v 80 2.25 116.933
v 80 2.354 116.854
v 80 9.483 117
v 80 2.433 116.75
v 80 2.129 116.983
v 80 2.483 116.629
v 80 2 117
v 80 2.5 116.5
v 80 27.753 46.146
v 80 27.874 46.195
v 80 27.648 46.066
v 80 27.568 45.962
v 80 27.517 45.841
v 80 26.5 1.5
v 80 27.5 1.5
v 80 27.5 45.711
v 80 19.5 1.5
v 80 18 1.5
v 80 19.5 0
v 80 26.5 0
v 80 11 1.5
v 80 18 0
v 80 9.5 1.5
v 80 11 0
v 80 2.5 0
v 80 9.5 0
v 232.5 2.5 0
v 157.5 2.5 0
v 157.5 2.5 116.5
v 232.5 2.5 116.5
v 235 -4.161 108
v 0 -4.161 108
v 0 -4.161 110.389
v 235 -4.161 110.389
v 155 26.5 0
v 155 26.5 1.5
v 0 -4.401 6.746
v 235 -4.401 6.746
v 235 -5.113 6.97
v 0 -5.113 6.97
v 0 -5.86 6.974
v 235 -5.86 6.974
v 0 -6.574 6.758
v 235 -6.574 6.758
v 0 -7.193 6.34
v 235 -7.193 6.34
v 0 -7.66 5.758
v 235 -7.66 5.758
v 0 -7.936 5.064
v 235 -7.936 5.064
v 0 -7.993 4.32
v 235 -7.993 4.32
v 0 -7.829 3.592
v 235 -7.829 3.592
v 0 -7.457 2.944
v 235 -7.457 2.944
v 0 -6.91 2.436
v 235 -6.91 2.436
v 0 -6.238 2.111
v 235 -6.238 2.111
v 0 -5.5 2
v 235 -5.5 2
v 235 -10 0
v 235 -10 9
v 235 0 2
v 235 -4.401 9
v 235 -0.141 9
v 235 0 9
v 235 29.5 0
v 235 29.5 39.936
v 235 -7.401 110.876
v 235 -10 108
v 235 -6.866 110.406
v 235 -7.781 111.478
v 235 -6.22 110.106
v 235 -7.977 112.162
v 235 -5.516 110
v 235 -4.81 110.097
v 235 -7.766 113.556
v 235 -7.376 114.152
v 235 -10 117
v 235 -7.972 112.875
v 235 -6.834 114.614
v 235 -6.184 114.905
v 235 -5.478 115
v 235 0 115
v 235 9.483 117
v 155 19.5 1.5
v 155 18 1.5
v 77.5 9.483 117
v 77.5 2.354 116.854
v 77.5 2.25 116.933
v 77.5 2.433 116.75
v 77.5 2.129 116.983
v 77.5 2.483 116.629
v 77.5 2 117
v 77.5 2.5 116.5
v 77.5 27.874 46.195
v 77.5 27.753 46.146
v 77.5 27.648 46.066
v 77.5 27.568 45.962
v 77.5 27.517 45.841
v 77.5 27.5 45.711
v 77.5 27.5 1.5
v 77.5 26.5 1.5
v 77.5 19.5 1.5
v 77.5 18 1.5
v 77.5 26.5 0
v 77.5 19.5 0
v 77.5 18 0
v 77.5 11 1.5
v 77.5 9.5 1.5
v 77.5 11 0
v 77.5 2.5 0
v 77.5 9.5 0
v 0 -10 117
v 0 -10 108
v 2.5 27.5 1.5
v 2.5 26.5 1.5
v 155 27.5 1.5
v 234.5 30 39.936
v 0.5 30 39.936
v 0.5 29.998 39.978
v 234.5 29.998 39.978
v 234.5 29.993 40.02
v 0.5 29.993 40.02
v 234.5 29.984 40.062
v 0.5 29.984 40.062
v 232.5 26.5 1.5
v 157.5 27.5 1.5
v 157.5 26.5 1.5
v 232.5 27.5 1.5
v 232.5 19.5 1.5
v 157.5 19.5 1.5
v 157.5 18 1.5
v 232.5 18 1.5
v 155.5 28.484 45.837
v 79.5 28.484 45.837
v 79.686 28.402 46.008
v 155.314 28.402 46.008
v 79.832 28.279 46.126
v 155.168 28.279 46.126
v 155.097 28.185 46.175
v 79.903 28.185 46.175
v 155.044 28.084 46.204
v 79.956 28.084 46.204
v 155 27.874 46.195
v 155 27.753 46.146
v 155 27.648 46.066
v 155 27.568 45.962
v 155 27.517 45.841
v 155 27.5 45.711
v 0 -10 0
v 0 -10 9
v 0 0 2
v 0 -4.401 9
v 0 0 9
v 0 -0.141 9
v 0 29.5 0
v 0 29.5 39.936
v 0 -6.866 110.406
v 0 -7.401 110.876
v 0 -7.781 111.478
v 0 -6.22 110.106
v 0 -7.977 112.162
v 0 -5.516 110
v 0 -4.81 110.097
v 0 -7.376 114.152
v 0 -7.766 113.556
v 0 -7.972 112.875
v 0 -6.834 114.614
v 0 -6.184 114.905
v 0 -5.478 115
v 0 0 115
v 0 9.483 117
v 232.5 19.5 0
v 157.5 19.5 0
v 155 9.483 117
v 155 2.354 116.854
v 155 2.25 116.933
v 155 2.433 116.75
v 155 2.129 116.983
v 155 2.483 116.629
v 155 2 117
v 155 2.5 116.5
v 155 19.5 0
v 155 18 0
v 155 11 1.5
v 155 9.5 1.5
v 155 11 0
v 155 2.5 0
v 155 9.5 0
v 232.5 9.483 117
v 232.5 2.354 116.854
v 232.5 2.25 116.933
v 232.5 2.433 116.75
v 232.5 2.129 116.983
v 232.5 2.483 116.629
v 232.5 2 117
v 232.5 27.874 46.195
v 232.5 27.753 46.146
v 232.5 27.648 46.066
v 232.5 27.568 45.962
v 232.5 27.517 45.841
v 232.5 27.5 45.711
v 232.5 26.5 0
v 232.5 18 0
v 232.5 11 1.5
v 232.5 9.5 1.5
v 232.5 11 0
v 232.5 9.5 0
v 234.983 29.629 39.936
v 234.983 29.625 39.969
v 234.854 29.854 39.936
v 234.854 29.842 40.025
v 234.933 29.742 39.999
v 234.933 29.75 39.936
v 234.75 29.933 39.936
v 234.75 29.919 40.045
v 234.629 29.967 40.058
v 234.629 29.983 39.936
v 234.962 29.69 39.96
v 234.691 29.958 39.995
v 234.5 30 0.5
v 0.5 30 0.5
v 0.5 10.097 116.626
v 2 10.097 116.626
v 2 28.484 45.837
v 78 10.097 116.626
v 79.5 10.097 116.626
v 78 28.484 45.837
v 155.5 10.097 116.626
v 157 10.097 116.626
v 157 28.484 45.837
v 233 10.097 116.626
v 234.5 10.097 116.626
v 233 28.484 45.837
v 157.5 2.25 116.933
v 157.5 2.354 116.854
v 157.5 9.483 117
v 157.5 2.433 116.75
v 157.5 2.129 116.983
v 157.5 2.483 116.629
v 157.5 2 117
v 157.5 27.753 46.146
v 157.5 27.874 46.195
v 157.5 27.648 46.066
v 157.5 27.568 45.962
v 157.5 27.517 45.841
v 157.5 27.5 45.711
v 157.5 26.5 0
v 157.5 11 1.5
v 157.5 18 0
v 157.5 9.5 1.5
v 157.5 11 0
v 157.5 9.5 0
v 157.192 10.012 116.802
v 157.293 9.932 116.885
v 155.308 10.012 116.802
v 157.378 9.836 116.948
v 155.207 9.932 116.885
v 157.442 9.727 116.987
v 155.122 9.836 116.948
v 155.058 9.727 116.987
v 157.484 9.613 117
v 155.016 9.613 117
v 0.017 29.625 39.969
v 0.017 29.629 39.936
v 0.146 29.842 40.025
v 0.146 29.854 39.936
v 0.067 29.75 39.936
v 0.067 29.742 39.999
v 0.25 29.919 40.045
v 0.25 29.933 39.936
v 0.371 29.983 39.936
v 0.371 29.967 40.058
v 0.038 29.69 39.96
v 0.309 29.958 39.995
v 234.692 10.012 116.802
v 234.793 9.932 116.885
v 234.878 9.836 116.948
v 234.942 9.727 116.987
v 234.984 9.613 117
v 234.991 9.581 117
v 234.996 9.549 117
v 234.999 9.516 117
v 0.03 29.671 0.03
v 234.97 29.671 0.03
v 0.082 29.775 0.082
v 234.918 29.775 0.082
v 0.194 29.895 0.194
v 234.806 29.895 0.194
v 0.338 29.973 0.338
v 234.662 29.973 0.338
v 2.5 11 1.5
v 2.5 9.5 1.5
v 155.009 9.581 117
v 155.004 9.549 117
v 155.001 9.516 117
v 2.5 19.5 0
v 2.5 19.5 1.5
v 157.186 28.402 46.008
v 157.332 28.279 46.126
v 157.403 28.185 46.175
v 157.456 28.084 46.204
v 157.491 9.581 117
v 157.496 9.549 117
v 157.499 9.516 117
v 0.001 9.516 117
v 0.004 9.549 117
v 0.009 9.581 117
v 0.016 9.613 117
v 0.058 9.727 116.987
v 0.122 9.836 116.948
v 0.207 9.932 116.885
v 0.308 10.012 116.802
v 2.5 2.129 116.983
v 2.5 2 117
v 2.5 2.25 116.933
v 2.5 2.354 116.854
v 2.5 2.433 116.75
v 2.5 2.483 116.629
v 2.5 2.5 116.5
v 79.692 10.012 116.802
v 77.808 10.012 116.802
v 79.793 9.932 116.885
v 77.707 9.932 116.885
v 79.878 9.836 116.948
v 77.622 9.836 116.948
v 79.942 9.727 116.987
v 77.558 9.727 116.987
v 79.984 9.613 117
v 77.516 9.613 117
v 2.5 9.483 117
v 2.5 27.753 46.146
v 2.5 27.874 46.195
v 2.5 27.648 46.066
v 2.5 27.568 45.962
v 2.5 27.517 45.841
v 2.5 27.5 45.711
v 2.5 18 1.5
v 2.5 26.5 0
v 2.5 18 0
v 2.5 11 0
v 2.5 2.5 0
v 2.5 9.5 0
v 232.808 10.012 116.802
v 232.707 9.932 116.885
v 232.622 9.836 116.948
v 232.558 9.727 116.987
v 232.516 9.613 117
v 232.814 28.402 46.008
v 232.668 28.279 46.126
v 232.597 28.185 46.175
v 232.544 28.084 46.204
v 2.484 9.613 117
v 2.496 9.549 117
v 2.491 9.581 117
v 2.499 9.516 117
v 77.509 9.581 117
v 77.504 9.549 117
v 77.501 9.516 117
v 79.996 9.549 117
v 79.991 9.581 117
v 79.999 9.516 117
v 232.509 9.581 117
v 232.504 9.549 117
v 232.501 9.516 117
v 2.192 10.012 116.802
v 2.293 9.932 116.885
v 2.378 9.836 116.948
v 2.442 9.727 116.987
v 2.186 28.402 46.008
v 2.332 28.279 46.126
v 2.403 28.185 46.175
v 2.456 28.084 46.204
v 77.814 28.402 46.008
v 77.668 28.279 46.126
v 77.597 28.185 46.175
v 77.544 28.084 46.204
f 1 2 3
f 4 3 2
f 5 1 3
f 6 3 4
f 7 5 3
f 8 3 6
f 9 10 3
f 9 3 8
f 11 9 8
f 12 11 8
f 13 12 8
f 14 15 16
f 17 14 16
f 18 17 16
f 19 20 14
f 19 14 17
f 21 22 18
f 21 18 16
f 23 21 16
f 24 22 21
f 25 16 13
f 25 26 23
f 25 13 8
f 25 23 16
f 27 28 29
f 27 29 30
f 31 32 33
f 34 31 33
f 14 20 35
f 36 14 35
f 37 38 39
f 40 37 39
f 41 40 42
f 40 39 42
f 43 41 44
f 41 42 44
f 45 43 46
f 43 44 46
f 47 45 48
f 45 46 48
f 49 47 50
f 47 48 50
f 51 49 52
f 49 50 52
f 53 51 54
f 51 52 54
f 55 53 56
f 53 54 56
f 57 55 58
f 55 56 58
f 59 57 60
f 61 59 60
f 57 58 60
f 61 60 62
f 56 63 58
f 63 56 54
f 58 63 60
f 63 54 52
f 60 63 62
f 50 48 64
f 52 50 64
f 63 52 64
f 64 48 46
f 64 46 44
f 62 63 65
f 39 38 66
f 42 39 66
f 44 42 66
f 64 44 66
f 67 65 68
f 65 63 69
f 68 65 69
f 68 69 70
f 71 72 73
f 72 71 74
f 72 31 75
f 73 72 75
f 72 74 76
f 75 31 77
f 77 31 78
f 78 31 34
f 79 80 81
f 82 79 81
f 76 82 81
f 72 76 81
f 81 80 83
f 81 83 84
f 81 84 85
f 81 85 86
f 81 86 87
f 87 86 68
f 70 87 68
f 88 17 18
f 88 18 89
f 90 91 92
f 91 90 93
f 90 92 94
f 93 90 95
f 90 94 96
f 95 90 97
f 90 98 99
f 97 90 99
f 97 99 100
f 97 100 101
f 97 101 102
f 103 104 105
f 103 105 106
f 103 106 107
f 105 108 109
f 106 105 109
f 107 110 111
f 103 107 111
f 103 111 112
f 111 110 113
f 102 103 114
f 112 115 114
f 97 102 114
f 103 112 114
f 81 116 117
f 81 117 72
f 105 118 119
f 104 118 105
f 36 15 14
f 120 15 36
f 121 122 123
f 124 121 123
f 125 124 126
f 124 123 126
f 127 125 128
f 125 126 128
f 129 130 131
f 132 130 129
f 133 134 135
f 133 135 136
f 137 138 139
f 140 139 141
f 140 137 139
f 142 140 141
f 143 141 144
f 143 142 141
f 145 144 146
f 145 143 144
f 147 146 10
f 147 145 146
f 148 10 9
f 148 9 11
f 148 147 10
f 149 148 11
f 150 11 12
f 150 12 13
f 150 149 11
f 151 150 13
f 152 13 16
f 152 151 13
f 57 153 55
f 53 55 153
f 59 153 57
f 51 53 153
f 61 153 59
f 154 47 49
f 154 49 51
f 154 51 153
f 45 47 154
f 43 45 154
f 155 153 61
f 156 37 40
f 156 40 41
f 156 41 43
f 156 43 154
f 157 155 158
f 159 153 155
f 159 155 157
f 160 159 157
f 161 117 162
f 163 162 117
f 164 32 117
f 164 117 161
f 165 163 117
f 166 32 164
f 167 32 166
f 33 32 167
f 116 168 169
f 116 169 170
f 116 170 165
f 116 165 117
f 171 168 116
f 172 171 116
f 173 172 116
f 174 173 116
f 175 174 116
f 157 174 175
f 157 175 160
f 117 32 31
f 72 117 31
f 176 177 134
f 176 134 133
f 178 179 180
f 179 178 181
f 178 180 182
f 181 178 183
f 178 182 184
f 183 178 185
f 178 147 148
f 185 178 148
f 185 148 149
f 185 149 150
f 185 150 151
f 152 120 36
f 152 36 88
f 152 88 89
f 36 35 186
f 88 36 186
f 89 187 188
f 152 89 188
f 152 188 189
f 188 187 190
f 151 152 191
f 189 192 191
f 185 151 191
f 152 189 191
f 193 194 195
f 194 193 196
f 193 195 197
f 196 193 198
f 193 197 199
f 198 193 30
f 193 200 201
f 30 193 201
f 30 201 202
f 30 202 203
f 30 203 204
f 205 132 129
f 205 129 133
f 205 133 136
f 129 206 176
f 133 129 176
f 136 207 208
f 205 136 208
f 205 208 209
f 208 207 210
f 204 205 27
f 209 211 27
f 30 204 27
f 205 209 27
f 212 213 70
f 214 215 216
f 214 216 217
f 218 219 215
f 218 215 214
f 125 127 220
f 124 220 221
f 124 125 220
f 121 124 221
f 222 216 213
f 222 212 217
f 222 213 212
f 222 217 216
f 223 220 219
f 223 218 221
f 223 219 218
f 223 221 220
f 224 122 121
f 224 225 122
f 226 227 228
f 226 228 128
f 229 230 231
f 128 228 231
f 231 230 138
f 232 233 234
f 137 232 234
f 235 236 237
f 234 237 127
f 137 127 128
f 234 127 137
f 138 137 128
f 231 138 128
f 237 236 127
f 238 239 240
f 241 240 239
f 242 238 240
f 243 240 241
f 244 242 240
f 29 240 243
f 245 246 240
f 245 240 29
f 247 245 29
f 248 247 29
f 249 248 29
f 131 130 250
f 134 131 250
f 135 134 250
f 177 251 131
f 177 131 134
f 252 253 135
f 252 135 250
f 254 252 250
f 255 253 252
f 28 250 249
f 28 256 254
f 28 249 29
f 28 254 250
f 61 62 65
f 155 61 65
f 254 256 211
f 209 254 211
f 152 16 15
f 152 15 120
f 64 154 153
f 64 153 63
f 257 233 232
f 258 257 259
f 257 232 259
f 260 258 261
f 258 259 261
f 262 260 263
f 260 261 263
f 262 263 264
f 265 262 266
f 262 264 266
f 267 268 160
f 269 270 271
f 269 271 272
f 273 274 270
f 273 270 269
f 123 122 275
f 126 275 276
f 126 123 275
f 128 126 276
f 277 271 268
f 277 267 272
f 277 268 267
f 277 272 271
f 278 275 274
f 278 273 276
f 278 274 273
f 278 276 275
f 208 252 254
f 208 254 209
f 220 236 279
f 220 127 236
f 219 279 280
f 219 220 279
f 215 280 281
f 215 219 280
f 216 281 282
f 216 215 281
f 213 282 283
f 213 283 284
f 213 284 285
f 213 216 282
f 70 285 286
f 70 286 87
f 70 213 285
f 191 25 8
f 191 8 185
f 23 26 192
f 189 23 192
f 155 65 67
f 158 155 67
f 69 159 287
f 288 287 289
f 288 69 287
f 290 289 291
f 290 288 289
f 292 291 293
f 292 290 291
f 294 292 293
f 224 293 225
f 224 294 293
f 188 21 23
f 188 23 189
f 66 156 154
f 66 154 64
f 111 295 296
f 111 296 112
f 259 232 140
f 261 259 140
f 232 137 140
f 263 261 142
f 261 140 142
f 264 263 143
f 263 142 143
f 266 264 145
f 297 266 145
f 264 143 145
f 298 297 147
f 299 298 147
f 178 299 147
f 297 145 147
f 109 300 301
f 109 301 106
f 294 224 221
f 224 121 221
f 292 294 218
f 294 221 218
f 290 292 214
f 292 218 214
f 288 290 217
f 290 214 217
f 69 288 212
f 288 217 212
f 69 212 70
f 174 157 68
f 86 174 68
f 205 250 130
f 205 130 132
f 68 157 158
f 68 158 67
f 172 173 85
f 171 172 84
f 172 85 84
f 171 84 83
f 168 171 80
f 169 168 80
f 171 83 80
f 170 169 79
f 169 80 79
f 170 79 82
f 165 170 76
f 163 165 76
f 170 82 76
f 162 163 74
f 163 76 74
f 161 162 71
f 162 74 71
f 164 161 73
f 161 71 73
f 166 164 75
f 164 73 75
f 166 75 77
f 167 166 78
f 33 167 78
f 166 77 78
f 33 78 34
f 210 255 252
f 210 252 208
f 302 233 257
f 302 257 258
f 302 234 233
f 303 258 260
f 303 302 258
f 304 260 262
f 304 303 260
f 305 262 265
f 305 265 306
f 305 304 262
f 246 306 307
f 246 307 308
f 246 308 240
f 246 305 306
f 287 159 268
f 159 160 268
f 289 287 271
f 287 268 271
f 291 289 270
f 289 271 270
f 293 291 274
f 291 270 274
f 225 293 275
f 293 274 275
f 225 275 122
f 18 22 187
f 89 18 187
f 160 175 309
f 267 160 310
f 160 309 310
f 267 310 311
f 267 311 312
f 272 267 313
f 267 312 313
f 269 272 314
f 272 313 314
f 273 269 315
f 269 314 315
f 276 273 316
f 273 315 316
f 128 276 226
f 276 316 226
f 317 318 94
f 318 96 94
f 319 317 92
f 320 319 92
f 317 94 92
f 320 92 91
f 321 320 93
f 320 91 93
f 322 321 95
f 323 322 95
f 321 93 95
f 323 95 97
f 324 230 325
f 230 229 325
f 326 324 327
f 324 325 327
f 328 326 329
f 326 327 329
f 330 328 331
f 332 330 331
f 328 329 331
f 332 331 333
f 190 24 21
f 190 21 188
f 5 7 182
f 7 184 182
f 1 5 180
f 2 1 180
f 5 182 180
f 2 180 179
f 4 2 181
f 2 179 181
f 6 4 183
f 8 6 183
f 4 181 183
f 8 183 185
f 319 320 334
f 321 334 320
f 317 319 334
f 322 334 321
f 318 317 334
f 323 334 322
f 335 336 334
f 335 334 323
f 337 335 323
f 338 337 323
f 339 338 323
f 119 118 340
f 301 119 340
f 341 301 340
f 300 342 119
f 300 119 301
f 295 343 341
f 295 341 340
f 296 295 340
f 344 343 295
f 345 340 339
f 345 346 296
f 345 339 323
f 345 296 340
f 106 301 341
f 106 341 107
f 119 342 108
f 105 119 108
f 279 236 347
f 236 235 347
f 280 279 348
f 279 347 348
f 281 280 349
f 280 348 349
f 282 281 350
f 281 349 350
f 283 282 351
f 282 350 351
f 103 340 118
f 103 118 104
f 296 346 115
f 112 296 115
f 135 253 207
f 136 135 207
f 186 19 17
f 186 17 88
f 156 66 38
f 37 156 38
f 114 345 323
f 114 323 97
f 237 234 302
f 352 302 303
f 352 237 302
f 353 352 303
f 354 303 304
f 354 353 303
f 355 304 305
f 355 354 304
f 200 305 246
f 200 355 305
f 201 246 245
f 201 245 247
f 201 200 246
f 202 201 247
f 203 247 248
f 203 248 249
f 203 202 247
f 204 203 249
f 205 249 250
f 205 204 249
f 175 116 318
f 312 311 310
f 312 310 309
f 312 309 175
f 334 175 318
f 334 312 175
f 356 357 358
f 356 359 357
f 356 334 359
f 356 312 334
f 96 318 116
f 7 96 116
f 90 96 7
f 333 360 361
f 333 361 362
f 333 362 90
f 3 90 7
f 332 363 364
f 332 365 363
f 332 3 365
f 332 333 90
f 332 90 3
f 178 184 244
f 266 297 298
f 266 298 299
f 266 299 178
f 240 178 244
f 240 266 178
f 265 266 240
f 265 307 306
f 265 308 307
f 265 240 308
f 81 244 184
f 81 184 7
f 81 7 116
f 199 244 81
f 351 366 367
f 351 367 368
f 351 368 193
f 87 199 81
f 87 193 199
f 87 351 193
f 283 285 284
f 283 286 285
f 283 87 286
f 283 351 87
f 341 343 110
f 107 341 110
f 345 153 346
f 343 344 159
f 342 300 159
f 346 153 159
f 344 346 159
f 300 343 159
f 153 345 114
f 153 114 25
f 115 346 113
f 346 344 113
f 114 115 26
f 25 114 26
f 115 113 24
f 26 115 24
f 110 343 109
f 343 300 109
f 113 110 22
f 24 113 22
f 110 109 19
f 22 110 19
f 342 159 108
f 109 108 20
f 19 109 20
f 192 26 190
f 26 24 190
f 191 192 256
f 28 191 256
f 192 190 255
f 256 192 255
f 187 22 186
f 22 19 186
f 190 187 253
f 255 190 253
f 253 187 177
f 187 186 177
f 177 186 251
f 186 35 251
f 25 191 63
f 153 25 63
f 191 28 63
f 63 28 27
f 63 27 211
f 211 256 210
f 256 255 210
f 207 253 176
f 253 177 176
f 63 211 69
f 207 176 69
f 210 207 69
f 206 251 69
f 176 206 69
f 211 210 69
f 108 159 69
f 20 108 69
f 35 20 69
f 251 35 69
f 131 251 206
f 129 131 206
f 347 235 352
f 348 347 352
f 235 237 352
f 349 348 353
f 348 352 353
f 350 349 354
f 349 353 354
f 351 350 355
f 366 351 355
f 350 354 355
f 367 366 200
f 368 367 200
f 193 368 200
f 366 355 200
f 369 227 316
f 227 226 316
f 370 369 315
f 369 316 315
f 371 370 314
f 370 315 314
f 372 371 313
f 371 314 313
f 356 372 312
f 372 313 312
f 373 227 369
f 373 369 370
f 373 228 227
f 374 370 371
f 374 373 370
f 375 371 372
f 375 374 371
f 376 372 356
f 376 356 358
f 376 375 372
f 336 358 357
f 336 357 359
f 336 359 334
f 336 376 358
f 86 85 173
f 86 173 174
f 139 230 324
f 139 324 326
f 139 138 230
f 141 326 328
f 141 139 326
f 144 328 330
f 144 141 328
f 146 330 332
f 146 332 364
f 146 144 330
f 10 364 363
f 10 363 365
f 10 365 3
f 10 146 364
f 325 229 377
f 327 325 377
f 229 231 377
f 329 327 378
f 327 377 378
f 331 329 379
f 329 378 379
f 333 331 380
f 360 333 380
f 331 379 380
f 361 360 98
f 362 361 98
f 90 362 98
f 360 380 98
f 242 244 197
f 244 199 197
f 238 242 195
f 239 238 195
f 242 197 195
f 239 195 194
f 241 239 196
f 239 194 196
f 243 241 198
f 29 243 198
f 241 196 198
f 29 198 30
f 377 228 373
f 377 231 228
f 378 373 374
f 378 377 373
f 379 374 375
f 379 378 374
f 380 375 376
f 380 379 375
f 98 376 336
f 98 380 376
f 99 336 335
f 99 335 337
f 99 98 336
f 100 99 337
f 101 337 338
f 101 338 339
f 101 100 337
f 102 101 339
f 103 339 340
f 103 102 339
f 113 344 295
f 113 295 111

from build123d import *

# Parameters (mm, degrees)
BOX_W                              = 235
BOX_H                              = 30
BOX_DEPTH                          = 117
SKETCH_W                           = 75
SKETCH_H                           = 25
POCKET_DEPTH                       = 115.5
POCKET001_DEPTH                    = 300
SKETCH002_W                        = 75
SKETCH002_H                        = 7
POCKET002_DEPTH                    = 5
SKETCH002_LINEARPATTERN001_2_W     = 75
SKETCH002_LINEARPATTERN001_2_H     = 7
POCKET002_LINEARPATTERN001_2_DEPTH = 5
SKETCH002_LINEARPATTERN001_3_W     = 75
SKETCH002_LINEARPATTERN001_3_H     = 7
POCKET002_LINEARPATTERN001_3_DEPTH = 5
LINEARPATTERN002_COUNT             = 3
LINEARPATTERN002_PITCH             = 8.5
FILLET_R                           = 0.5
SKETCH003_W                        = 235
SKETCH003_H                        = 9
PAD_DEPTH                          = 10
POCKET003_DEPTH                    = 235.001


with BuildPart() as part:
    # Box → Box (new body)
    with BuildSketch(Plane.XY):
        with Locations((117.5, 15)):
            Rectangle(BOX_W, BOX_H)
    extrude(amount=BOX_DEPTH)

    # Sketch (on Face6 of BaseFeature) → Pocket (cut)
    with BuildSketch(Plane.XY.offset(117)):
        with Locations((40, 15)):
            Rectangle(SKETCH_W, SKETCH_H)
        with Locations((117.5, 15)):
            Rectangle(SKETCH_W, SKETCH_H)
        with Locations((195, 15)):
            Rectangle(SKETCH_W, SKETCH_H)
    extrude(amount=-POCKET_DEPTH, mode=Mode.SUBTRACT)

    # Sketch001 (on Face6 of Pocket) → Pocket001 (cut)
    with BuildSketch(Plane.YZ.offset(235)):
        Polygon((10, 117), (30, 40), (40, 120), align=None)
    extrude(amount=-POCKET001_DEPTH, mode=Mode.SUBTRACT)

    # Sketch002 (on Face5 of Pocket001) → Pocket002 (cut)
    with BuildSketch(Plane(origin=(0, 0, 0), x_dir=(1, 0, 0), z_dir=(0, 0, -1))):
        with Locations((40, -6)):
            Rectangle(SKETCH002_W, SKETCH002_H)
    pocket002 = extrude(amount=-POCKET002_DEPTH, mode=Mode.SUBTRACT)

    # Sketch002 LinearPattern001 2 → Pocket002 LinearPattern001 2 (cut)
    with BuildSketch(Plane(origin=(77.5, 0, 0), x_dir=(1, 0, 0), z_dir=(0, 0, -1))):
        with Locations((40, -6)):
            Rectangle(SKETCH002_LINEARPATTERN001_2_W, SKETCH002_LINEARPATTERN001_2_H)
    pocket002_linearpattern001_2 = extrude(amount=-POCKET002_LINEARPATTERN001_2_DEPTH, mode=Mode.SUBTRACT)

    # Sketch002 LinearPattern001 3 → Pocket002 LinearPattern001 3 (cut)
    with BuildSketch(Plane(origin=(155, 0, 0), x_dir=(1, 0, 0), z_dir=(0, 0, -1))):
        with Locations((40, -6)):
            Rectangle(SKETCH002_LINEARPATTERN001_3_W, SKETCH002_LINEARPATTERN001_3_H)
    pocket002_linearpattern001_3 = extrude(amount=-POCKET002_LINEARPATTERN001_3_DEPTH, mode=Mode.SUBTRACT)

    # LinearPattern002: Pocket002, Pocket002 LinearPattern001 2, Pocket002 LinearPattern001 3 ×3
    with Locations(*[(0, i * LINEARPATTERN002_PITCH, 0) for i in range(1, LINEARPATTERN002_COUNT)]):
        add(pocket002, mode=Mode.SUBTRACT)
        add(pocket002_linearpattern001_2, mode=Mode.SUBTRACT)
        add(pocket002_linearpattern001_3, mode=Mode.SUBTRACT)

    # Fillet
    fillet_edges = [part.edges().sort_by_distance(p)[0] for p in [
        (117.5, 30, 40),
        (117.5, 30, 0),
        (0, 30, 20),
        (0, 20, 78.5),
        (2.5, 18.75, 83.3125),
        (40, 27.5, 49.625),
        (77.5, 18.75, 83.3125),
        (80, 18.75, 83.3125),
        (117.5, 27.5, 49.625),
        (155, 18.75, 83.3125),
        (157.5, 18.75, 83.3125),
        (195, 27.5, 49.625),
        (232.5, 18.75, 83.3125),
        (235, 20, 78.5),
        (235, 30, 20),
        (1.25, 10, 117),
        (78.75, 10, 117),
        (156.25, 10, 117),
        (233.75, 10, 117),
        (195, 2.5, 117),
        (40, 2.5, 117),
        (117.5, 2.5, 117),
    ]]
    fillet(fillet_edges, radius=FILLET_R)

    # Sketch003 (on Face4 of Fillet) → Pad (join)
    with BuildSketch(Plane.XZ):
        with Locations((117.5, 112.5)):
            Rectangle(SKETCH003_W, SKETCH003_H)
        with Locations((117.5, 4.5)):
            Rectangle(SKETCH003_W, SKETCH003_H)
    extrude(amount=PAD_DEPTH)

    # Sketch004 (on Face76 of Pad) → Pocket003 (cut, through all)
    with BuildSketch(Plane.YZ.offset(235)):
        with BuildLine():
            ThreePointArc((-5.478476, 114.999907), (-7.903779, 111.813088), (-4.160827, 110.38893))
            Line((-4.160827, 105.760277), (-4.160827, 110.38893))
            Line((0, 105.760277), (-4.160827, 105.760277))
            Line((0, 114.999907), (0, 105.760277))
            Line((-5.478476, 114.999907), (0, 114.999907))
        make_face()
        with BuildLine():
            ThreePointArc((-4.401101, 6.745533), (-7.935553, 5.063989), (-5.5, 2))
            Line((-5.5, 2), (0, 2))
            Line((0, 2), (-0.240678, 13.918851))
            Line((-0.240678, 13.918851), (-4.401101, 13.860906))
            Line((-4.401101, 13.860906), (-4.401101, 6.745533))
        make_face()
    extrude(amount=-POCKET003_DEPTH, mode=Mode.SUBTRACT)


solid = part.part
